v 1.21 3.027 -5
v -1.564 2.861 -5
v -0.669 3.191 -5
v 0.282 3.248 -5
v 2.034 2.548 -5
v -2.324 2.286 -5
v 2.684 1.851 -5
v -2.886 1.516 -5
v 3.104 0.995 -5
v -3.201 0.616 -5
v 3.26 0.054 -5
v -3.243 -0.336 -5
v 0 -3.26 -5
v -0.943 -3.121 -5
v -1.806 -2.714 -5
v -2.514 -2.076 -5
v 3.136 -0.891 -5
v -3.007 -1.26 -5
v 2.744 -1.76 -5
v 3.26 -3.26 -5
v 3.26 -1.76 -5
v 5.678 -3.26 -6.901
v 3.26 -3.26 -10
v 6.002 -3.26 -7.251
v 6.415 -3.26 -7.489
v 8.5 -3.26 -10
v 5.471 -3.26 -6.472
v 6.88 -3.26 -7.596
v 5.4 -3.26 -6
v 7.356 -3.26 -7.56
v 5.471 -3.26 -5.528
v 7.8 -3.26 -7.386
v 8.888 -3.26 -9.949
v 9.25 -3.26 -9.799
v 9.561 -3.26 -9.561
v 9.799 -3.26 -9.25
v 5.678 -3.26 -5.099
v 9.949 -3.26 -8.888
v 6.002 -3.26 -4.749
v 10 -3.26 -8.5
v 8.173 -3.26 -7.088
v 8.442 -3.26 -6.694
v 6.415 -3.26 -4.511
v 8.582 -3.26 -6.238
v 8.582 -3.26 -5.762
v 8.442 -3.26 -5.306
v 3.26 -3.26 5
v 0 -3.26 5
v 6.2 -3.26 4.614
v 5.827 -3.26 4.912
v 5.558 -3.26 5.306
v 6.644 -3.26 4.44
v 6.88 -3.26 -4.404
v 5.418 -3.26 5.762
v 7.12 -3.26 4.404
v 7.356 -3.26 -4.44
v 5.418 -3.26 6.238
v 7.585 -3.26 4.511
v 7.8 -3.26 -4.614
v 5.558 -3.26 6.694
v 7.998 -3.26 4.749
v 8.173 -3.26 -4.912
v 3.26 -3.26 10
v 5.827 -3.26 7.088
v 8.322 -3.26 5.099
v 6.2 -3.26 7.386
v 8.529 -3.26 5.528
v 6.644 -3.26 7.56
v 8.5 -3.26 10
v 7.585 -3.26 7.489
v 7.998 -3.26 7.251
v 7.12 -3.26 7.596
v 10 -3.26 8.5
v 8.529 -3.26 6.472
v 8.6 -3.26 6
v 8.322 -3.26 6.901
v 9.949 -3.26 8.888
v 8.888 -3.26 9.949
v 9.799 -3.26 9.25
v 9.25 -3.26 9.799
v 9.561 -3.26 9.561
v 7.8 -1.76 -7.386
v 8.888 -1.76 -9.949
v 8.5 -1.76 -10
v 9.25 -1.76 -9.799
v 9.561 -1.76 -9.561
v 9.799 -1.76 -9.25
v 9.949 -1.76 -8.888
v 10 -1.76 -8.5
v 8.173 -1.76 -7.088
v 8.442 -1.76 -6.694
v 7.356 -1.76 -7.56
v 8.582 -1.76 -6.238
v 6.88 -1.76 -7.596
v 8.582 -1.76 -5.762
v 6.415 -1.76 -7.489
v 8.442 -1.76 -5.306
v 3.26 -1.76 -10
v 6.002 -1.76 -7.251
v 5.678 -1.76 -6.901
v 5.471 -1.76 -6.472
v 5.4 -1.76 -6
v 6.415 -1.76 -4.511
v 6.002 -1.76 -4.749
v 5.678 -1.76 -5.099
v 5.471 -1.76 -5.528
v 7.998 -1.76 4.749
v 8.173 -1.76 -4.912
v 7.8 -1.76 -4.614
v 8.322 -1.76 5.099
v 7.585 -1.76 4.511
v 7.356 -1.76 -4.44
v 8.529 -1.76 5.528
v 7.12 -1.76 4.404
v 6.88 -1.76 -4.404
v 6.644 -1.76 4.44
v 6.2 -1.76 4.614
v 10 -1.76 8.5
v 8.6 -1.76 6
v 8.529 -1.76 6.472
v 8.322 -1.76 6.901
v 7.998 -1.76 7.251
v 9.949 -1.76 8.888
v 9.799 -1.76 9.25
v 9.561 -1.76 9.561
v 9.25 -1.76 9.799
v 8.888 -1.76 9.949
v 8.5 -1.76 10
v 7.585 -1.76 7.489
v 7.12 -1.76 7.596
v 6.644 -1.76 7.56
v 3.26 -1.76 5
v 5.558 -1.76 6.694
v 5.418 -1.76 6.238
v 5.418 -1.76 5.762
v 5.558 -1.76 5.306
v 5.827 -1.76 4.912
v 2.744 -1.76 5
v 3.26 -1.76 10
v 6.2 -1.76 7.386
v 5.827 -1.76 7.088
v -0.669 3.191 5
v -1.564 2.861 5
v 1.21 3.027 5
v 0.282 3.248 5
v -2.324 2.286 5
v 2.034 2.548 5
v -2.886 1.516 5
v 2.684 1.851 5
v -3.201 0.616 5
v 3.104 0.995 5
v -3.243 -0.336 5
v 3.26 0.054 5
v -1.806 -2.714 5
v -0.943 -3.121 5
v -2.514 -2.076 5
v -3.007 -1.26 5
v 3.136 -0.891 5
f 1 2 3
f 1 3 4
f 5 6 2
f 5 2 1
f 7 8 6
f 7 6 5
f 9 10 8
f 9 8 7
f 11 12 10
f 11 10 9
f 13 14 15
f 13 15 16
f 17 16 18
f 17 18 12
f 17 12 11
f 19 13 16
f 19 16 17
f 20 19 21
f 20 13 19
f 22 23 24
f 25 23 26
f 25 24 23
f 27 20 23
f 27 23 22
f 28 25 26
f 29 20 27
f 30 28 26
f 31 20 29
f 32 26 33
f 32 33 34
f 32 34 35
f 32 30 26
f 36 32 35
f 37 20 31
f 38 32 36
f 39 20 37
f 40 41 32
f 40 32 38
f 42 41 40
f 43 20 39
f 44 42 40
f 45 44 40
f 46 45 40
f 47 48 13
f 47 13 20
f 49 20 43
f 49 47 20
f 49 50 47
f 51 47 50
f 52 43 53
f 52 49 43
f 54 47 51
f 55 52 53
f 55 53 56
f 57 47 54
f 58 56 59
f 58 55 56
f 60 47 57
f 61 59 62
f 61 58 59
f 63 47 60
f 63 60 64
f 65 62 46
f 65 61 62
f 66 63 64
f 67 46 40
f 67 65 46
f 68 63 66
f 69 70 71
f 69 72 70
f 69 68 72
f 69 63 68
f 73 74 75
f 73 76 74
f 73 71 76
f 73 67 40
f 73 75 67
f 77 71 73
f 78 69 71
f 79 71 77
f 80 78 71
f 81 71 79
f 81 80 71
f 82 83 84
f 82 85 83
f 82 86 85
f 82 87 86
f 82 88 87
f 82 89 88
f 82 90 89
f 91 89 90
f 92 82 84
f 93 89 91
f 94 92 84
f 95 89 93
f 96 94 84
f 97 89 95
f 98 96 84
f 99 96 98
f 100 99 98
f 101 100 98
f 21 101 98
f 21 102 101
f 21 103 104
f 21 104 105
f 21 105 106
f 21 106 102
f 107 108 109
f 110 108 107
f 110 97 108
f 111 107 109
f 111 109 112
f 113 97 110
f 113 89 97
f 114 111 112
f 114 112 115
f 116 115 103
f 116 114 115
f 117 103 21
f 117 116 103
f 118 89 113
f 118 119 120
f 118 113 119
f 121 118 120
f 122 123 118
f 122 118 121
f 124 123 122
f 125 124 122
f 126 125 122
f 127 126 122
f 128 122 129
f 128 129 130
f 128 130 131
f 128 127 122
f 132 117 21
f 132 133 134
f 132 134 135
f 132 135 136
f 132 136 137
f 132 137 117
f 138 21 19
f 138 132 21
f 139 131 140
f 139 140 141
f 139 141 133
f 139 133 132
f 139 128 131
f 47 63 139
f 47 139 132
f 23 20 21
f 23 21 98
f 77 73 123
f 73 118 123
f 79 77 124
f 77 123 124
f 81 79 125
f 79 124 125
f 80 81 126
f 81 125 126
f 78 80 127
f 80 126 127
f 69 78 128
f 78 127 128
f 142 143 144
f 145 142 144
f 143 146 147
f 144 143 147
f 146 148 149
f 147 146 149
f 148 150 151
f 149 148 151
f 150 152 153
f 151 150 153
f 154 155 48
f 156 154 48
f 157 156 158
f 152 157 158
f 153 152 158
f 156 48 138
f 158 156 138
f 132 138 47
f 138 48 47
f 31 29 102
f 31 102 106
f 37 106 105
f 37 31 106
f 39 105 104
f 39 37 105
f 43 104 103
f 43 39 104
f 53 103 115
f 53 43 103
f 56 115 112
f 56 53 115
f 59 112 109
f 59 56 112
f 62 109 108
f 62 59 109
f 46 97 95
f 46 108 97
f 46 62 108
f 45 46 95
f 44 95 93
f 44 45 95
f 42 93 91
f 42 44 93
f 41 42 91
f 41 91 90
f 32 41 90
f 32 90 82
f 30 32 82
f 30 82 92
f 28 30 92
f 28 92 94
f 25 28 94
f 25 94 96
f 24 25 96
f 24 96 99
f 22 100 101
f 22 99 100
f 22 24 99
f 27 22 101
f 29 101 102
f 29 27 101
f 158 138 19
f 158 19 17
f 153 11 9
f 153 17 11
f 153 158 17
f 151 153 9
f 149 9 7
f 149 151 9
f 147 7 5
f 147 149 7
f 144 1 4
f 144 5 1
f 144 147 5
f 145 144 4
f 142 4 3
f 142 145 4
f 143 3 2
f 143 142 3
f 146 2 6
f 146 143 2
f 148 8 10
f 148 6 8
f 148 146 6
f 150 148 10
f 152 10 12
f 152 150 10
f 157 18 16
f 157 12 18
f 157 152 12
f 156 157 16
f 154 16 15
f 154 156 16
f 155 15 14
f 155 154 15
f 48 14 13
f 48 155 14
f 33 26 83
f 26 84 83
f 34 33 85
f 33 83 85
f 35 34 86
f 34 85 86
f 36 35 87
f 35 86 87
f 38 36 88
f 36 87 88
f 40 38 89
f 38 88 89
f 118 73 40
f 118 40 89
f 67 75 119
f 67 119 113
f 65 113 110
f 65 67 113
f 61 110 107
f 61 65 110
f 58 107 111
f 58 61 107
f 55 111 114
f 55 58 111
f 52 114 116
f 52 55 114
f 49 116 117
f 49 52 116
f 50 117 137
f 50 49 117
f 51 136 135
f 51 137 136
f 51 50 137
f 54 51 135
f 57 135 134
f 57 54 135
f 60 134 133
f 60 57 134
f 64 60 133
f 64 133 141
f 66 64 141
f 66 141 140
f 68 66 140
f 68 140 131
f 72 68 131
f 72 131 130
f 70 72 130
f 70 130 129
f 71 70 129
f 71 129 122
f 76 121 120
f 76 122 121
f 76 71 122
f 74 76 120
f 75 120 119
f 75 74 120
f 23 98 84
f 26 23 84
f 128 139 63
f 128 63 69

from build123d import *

# Parameters (mm, degrees)
EXTRUDE_1_DEPTH          = 10
CUT_EXTRUDE_1_DEPTH      = 16.006678513
CUT_EXTRUDE_1_DEPTH_BACK = 16.006678513
SKETCH_2_R               = 1.6
SKETCH_2_W               = 6.52
SKETCH_2_H               = 5
FILLET_1_R               = 1.5


with BuildPart() as part:
    # 草图1 → 凸台-拉伸1 (new, symmetric)
    with BuildSketch(Plane.XY):
        with BuildLine():
            Line((0, -3.26), (10, -3.26))
            Line((10, -3.26), (10, -1.76))
            Line((10, -1.76), (2.744084547, -1.76))
            ThreePointArc((2.744084547, -1.76), (-1.563649577, 2.860524427), (0, -3.26))
        make_face()
    extrude(amount=EXTRUDE_1_DEPTH, both=True)

    # 草图2 → 切除-拉伸1 (cut, two sides: drawn at the far end of the back side and taken through both)
    with BuildSketch(Plane(origin=(0, -1.76, 0), x_dir=(1, 0, 0), z_dir=(0, 1, 0)).offset(-CUT_EXTRUDE_1_DEPTH_BACK)):
        with Locations(Location((7, 6, 0), (0, 0, 180))):
            Circle(SKETCH_2_R)
        with Locations((7, -6)):
            Circle(SKETCH_2_R)
        with Locations((0, 7.5)):
            Rectangle(SKETCH_2_W, SKETCH_2_H)
        with Locations((0, -7.5)):
            Rectangle(SKETCH_2_W, SKETCH_2_H)
    extrude(amount=CUT_EXTRUDE_1_DEPTH + CUT_EXTRUDE_1_DEPTH_BACK, mode=Mode.SUBTRACT)

    # 圆角1
    fillet_1_edges = [part.edges().sort_by_distance(p)[0] for p in [
        (10, -2.51, 10),
        (10, -2.51, -10),
    ]]
    fillet(fillet_1_edges, radius=FILLET_1_R)


solid = part.part
